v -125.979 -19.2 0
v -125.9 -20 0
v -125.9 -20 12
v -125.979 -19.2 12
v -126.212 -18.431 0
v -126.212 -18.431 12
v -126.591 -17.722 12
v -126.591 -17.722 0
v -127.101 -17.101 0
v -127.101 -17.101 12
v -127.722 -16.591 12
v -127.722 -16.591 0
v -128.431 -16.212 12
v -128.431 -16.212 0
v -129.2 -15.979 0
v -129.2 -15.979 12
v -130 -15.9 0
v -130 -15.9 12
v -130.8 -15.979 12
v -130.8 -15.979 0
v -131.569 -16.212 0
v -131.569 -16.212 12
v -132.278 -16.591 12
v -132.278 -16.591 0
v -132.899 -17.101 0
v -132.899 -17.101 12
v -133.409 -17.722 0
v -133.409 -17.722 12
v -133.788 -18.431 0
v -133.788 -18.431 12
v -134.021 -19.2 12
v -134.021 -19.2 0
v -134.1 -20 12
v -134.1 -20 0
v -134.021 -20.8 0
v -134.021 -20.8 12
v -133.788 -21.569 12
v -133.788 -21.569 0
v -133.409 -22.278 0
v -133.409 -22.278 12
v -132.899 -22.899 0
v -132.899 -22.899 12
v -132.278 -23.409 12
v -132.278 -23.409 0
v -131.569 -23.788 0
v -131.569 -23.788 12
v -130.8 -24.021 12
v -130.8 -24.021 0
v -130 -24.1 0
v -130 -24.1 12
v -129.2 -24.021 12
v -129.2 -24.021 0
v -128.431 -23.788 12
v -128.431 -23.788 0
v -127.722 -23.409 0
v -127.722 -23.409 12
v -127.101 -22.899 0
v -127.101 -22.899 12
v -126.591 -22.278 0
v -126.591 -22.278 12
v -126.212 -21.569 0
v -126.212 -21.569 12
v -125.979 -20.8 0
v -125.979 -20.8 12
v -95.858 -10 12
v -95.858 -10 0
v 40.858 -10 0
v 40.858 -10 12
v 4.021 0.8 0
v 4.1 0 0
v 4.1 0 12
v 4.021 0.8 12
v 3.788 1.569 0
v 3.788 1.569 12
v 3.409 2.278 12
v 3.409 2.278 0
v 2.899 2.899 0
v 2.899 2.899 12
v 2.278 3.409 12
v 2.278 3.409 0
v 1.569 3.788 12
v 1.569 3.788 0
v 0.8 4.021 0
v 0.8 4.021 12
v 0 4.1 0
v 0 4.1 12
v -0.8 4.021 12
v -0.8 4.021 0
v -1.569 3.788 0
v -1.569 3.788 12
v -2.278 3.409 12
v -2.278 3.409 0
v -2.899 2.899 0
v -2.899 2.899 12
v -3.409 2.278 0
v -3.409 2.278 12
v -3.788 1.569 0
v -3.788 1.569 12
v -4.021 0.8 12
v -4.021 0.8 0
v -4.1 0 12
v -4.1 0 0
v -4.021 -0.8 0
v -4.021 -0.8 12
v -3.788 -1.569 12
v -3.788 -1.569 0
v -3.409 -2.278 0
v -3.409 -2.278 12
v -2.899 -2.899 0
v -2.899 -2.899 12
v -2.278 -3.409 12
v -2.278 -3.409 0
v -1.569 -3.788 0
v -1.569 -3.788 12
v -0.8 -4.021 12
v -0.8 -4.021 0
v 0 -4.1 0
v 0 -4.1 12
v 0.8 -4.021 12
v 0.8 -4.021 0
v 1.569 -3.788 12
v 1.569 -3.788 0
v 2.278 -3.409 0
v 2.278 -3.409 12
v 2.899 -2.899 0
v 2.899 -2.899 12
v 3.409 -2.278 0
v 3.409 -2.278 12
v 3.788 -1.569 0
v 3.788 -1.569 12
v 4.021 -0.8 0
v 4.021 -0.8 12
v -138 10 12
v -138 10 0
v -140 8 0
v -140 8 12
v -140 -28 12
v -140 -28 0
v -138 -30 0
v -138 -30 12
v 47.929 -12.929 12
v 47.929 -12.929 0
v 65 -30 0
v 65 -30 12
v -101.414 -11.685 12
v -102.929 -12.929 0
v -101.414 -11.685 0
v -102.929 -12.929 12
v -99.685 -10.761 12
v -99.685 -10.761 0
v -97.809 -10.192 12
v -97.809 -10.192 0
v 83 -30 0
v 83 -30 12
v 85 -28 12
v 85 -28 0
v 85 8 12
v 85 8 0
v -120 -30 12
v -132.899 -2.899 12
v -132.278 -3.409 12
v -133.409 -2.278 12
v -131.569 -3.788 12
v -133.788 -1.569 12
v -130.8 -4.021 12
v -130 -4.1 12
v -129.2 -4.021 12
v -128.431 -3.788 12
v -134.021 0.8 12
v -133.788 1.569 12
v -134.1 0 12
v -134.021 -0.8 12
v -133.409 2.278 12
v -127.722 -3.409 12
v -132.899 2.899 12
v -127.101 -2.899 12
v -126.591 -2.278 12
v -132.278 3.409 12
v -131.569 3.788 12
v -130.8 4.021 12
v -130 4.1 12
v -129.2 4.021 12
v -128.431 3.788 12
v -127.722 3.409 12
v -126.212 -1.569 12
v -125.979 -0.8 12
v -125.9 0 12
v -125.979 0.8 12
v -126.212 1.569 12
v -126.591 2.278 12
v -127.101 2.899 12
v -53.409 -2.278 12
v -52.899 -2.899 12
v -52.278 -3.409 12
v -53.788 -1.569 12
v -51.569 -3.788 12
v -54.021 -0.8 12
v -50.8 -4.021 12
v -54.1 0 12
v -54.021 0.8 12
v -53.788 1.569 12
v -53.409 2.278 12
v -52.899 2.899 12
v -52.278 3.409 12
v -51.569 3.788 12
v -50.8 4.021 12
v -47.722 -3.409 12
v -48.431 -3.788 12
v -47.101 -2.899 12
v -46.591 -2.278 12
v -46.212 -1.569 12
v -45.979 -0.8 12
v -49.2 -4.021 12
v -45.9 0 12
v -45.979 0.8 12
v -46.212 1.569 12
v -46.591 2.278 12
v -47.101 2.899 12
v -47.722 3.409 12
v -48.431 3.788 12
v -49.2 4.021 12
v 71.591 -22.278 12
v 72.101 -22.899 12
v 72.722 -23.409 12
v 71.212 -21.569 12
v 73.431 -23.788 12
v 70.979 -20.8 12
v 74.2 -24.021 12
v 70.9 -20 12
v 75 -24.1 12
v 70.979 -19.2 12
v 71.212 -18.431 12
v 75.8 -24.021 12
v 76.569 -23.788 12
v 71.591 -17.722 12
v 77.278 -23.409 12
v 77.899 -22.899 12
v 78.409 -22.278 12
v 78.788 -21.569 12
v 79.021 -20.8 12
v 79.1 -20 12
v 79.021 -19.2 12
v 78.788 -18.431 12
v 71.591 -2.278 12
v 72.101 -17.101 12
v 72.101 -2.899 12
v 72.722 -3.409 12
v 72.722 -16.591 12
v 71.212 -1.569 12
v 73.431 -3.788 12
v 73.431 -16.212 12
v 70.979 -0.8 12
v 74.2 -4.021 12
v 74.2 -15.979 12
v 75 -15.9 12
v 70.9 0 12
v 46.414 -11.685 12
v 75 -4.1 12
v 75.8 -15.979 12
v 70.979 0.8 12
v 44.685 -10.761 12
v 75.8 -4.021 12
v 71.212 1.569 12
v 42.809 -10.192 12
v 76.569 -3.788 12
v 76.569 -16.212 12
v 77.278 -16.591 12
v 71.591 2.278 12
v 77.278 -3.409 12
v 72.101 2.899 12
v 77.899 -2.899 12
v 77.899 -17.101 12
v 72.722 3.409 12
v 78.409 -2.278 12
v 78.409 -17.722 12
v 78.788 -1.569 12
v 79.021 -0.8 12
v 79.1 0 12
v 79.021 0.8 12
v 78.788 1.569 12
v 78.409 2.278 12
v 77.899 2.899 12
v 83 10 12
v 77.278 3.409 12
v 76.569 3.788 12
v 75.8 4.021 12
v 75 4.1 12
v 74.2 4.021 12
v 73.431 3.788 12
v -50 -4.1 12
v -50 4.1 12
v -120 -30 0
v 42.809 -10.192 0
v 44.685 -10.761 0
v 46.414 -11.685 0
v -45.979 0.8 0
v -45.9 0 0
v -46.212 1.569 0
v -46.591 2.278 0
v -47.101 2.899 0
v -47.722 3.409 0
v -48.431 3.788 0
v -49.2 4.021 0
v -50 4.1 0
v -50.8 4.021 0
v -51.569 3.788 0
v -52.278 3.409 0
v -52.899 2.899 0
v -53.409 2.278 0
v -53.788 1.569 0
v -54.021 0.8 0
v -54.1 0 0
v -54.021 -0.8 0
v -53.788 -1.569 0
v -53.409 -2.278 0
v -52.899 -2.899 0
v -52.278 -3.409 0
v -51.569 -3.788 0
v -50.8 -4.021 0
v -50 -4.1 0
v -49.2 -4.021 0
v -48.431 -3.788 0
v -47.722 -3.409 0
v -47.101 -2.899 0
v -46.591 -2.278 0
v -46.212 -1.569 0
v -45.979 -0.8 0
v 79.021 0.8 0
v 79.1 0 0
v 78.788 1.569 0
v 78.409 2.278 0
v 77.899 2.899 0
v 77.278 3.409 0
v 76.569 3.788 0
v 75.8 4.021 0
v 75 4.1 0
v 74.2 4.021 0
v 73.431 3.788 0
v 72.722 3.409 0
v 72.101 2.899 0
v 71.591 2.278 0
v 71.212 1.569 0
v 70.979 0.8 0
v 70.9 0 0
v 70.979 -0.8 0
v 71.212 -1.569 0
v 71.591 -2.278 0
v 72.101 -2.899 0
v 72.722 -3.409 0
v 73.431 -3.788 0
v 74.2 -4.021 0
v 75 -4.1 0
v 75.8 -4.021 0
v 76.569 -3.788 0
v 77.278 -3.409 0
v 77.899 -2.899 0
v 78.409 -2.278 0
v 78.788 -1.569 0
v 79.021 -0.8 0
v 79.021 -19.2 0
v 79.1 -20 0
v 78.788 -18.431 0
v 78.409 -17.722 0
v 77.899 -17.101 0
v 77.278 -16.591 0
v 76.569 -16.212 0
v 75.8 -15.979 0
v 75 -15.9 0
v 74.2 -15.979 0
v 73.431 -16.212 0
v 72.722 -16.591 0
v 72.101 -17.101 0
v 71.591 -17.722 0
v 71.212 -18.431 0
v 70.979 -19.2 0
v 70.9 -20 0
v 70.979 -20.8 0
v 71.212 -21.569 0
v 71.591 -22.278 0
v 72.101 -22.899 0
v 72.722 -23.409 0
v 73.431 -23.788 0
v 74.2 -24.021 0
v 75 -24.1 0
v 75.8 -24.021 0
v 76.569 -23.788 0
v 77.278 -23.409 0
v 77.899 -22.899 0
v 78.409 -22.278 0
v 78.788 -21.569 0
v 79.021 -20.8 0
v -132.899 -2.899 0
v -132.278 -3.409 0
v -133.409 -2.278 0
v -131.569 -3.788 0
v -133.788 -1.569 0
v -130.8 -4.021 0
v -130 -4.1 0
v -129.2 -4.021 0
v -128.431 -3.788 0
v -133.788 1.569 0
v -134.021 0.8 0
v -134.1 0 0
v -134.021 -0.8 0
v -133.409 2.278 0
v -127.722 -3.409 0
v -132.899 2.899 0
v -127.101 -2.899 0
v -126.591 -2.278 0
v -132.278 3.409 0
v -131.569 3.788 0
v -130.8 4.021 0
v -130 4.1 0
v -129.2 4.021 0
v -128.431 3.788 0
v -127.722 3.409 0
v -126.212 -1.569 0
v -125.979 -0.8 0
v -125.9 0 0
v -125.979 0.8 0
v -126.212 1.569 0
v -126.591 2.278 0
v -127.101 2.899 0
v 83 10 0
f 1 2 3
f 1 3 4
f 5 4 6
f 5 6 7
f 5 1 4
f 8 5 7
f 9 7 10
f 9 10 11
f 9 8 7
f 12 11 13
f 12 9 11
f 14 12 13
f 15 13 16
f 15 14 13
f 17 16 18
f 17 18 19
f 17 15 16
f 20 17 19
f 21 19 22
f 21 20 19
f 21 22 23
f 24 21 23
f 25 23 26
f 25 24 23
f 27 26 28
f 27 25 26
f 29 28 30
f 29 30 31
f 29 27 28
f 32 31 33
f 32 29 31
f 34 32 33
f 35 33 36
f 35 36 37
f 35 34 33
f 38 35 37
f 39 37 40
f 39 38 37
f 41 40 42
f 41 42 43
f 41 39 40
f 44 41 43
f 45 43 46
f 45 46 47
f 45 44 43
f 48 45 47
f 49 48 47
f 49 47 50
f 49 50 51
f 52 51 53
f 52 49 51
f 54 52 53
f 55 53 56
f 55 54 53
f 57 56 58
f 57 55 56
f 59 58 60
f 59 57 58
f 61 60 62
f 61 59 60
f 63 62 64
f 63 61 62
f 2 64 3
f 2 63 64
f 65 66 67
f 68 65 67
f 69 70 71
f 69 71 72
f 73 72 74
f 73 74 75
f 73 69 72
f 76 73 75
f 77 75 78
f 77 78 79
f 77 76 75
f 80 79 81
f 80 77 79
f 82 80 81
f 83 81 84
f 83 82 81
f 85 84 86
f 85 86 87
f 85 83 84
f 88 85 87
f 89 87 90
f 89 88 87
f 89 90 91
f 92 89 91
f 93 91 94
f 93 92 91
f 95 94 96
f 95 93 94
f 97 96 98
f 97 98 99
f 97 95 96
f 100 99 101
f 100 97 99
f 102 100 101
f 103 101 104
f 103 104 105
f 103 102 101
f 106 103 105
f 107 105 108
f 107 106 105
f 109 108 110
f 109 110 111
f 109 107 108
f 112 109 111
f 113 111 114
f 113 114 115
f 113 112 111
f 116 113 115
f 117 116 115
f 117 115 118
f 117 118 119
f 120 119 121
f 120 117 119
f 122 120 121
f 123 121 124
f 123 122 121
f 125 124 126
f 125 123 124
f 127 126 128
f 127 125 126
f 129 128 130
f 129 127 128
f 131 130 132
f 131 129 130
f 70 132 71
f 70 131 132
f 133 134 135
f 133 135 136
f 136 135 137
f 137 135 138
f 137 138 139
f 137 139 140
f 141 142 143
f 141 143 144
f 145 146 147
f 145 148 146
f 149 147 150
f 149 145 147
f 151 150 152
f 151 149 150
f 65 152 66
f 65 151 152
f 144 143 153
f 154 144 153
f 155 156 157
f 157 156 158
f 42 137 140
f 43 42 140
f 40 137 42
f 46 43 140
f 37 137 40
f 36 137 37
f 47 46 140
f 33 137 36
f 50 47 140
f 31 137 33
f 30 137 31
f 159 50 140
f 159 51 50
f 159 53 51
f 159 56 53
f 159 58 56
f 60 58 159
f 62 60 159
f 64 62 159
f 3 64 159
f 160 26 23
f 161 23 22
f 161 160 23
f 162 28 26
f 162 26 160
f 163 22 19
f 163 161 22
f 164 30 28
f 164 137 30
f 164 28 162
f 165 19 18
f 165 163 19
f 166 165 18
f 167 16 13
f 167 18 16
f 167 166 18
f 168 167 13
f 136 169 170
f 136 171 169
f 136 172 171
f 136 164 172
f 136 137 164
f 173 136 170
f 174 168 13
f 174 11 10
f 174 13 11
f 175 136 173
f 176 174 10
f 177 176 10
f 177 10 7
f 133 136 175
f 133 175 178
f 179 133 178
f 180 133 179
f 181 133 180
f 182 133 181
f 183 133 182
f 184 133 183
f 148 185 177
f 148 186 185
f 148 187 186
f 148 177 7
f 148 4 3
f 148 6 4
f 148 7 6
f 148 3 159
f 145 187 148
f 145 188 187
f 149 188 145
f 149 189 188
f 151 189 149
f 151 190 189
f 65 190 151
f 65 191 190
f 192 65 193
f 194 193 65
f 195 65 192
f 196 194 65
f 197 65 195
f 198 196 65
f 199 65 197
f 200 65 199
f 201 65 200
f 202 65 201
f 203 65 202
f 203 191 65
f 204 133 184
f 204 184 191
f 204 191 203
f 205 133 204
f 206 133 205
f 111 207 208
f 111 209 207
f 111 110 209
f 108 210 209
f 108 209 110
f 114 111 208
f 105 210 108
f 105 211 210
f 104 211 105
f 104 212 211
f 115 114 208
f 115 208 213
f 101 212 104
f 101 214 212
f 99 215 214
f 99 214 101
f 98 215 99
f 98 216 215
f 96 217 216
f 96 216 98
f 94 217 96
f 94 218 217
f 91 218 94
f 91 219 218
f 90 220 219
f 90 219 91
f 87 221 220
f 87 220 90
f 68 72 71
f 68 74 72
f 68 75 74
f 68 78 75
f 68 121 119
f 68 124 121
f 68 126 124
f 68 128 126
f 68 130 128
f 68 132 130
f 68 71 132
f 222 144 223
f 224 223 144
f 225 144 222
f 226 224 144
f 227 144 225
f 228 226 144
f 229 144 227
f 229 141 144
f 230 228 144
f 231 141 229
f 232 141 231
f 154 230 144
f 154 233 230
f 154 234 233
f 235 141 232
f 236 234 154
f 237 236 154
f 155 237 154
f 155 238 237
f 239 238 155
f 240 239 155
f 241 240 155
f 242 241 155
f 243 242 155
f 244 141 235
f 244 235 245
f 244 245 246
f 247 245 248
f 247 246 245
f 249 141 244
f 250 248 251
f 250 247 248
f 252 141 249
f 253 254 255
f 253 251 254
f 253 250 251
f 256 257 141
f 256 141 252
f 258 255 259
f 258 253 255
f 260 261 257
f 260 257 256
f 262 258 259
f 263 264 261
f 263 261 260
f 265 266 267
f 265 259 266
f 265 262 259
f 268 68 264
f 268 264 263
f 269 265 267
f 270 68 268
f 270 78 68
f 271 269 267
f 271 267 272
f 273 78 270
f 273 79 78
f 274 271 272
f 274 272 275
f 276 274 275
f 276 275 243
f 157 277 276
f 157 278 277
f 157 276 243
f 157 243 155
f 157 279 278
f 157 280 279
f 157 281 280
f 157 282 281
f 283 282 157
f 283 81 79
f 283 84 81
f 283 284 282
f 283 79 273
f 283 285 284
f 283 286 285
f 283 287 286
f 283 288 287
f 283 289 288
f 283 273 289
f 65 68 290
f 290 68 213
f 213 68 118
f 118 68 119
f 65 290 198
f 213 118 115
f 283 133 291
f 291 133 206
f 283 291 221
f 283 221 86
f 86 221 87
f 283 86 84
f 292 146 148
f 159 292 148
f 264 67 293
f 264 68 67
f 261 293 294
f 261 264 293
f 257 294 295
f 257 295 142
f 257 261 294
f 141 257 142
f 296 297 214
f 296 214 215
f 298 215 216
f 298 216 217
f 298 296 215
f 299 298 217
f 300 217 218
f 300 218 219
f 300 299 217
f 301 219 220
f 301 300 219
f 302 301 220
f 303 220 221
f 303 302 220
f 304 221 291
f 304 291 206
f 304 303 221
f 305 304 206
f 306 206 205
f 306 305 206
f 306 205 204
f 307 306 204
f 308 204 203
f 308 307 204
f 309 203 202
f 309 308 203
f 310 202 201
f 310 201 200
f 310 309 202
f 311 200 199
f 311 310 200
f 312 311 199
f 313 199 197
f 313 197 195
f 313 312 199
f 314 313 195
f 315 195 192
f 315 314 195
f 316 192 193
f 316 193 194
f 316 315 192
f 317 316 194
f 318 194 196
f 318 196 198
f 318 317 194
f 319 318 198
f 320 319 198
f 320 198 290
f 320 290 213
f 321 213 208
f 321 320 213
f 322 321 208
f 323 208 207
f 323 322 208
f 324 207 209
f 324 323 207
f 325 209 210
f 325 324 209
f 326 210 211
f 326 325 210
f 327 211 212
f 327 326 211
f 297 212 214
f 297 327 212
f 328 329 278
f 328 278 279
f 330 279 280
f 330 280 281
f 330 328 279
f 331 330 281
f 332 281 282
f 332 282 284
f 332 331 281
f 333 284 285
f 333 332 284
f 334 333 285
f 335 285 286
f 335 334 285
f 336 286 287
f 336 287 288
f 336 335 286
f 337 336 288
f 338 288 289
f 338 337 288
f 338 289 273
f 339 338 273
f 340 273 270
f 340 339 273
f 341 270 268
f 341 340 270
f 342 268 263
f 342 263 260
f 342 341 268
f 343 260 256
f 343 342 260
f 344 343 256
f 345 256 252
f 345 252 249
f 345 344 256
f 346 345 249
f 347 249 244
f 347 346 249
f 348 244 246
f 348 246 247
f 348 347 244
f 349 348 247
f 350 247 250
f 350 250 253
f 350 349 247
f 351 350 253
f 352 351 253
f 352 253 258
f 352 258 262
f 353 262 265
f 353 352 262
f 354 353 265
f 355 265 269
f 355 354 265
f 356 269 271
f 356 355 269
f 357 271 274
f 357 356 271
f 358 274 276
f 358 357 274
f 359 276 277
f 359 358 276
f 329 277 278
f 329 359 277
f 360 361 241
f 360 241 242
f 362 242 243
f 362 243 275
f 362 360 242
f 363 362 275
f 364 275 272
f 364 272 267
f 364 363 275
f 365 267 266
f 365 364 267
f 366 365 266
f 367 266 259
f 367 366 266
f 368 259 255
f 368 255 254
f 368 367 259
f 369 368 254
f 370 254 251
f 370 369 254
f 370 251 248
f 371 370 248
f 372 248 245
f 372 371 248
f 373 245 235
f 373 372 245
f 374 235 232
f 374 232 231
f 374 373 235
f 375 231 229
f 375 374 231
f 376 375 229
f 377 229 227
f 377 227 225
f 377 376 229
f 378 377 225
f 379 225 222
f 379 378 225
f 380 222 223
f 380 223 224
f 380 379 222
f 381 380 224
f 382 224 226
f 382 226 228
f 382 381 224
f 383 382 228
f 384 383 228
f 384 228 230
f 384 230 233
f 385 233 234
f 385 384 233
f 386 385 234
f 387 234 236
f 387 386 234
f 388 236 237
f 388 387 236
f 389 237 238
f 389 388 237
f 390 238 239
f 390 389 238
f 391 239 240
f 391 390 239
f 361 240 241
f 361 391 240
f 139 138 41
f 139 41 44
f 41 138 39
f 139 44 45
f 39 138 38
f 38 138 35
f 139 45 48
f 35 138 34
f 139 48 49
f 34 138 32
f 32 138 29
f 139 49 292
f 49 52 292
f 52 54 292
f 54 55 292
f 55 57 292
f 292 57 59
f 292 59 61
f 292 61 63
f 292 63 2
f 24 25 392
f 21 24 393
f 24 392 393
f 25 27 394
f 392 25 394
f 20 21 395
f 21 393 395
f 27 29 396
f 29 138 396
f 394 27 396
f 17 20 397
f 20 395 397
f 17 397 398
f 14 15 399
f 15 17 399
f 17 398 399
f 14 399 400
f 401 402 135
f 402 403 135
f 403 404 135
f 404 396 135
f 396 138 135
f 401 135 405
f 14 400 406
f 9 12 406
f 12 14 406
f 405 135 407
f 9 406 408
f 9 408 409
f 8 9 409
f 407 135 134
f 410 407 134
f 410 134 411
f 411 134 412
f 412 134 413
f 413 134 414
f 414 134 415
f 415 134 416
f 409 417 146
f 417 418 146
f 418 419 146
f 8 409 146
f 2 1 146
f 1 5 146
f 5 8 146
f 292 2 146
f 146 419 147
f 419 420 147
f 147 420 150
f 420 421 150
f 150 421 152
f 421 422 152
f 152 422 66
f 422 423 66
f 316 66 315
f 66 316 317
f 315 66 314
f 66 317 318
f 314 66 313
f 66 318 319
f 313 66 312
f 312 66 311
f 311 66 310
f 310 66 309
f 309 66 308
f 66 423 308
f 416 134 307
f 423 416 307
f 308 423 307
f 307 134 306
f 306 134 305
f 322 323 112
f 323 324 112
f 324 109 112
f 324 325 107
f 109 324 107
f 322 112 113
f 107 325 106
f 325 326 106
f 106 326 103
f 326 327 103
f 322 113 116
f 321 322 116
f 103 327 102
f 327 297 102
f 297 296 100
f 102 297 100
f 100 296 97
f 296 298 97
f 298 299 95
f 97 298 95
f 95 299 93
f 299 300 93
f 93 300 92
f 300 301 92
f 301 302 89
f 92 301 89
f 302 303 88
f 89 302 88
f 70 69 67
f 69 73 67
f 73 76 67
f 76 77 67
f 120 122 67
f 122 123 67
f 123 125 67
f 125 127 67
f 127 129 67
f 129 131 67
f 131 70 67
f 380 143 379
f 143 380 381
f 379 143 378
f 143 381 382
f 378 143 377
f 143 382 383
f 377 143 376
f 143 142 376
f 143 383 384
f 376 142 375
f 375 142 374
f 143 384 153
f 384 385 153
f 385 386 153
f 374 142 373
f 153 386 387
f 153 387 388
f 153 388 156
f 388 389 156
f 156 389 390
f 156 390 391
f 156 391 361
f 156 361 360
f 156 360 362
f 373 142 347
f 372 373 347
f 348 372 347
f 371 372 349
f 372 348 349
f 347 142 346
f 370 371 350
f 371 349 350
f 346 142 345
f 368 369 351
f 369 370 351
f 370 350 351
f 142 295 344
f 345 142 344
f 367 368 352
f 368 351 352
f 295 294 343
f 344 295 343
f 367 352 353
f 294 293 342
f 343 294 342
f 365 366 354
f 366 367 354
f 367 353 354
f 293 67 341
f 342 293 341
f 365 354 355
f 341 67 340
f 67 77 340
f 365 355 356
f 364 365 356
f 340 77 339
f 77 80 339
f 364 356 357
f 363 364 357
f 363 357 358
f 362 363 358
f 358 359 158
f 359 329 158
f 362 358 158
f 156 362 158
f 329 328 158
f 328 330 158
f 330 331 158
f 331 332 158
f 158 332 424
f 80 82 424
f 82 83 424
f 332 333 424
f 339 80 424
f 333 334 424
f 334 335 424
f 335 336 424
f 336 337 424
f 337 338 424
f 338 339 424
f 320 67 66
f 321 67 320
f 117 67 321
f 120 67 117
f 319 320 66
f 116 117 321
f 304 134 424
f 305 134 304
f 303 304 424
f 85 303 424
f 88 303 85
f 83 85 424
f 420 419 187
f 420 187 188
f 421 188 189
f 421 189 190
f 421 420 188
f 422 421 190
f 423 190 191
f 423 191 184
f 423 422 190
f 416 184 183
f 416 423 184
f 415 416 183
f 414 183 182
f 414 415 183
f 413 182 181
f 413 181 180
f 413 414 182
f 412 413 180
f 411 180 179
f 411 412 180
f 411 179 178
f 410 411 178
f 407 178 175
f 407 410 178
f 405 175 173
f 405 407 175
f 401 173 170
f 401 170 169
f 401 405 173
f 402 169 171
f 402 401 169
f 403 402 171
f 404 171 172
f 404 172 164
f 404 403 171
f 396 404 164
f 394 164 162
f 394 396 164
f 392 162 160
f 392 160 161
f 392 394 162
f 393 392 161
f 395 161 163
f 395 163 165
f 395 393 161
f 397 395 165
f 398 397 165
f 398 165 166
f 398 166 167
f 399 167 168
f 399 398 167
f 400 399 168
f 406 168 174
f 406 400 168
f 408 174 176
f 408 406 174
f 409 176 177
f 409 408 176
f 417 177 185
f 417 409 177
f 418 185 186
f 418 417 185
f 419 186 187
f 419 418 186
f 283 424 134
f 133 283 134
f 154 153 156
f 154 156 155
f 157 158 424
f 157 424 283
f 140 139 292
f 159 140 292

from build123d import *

# Parameters (mm, degrees)
SKETCH_1_R      = 4.1
EXTRUDE_1_DEPTH = 12
CHAMFER_1_SIZE  = 20
FILLET_1_R      = 10
CHAMFER_2_SIZE  = 2


with BuildPart() as part:
    # 草图1 → 凸台-拉伸1 (new body)
    with BuildSketch(Plane.XY):
        Polygon((-140, -10), (-140, -30), (-120, -30), (-120, -10), (10, -10), (65, -10), (65, -30), (85, -30), (85, 10), (10, 10), (-120, 10), (-140, 10), align=None)
        Circle(SKETCH_1_R, mode=Mode.SUBTRACT)
        with Locations((-50, 0)):
            Circle(SKETCH_1_R, mode=Mode.SUBTRACT)
        with Locations((-130, 0)):
            Circle(SKETCH_1_R, mode=Mode.SUBTRACT)
        with Locations((-130, -20)):
            Circle(SKETCH_1_R, mode=Mode.SUBTRACT)
        with Locations((75, 0)):
            Circle(SKETCH_1_R, mode=Mode.SUBTRACT)
        with Locations((75, -20)):
            Circle(SKETCH_1_R, mode=Mode.SUBTRACT)
    extrude(amount=EXTRUDE_1_DEPTH)

    # 倒角1
    chamfer_1_edges = [part.edges().sort_by_distance(p)[0] for p in [
        (65, -10, 6),
        (-120, -10, 6),
    ]]
    chamfer(chamfer_1_edges, length=CHAMFER_1_SIZE - 0.0001)  # a hair under: the kernel refuses the full size

    # 圆角1
    fillet_1_edges = [part.edges().sort_by_distance(p)[0] for p in [
        (-100.0001, -10, 6),
        (45.0001, -10, 6),
    ]]
    fillet(fillet_1_edges, radius=FILLET_1_R)

    # 倒角2
    chamfer_2_edges = [part.edges().sort_by_distance(p)[0] for p in [
        (-140, -30, 6),
        (-140, 10, 6),
        (85, 10, 6),
        (85, -30, 6),
    ]]
    chamfer(chamfer_2_edges, length=CHAMFER_2_SIZE)


solid = part.part
